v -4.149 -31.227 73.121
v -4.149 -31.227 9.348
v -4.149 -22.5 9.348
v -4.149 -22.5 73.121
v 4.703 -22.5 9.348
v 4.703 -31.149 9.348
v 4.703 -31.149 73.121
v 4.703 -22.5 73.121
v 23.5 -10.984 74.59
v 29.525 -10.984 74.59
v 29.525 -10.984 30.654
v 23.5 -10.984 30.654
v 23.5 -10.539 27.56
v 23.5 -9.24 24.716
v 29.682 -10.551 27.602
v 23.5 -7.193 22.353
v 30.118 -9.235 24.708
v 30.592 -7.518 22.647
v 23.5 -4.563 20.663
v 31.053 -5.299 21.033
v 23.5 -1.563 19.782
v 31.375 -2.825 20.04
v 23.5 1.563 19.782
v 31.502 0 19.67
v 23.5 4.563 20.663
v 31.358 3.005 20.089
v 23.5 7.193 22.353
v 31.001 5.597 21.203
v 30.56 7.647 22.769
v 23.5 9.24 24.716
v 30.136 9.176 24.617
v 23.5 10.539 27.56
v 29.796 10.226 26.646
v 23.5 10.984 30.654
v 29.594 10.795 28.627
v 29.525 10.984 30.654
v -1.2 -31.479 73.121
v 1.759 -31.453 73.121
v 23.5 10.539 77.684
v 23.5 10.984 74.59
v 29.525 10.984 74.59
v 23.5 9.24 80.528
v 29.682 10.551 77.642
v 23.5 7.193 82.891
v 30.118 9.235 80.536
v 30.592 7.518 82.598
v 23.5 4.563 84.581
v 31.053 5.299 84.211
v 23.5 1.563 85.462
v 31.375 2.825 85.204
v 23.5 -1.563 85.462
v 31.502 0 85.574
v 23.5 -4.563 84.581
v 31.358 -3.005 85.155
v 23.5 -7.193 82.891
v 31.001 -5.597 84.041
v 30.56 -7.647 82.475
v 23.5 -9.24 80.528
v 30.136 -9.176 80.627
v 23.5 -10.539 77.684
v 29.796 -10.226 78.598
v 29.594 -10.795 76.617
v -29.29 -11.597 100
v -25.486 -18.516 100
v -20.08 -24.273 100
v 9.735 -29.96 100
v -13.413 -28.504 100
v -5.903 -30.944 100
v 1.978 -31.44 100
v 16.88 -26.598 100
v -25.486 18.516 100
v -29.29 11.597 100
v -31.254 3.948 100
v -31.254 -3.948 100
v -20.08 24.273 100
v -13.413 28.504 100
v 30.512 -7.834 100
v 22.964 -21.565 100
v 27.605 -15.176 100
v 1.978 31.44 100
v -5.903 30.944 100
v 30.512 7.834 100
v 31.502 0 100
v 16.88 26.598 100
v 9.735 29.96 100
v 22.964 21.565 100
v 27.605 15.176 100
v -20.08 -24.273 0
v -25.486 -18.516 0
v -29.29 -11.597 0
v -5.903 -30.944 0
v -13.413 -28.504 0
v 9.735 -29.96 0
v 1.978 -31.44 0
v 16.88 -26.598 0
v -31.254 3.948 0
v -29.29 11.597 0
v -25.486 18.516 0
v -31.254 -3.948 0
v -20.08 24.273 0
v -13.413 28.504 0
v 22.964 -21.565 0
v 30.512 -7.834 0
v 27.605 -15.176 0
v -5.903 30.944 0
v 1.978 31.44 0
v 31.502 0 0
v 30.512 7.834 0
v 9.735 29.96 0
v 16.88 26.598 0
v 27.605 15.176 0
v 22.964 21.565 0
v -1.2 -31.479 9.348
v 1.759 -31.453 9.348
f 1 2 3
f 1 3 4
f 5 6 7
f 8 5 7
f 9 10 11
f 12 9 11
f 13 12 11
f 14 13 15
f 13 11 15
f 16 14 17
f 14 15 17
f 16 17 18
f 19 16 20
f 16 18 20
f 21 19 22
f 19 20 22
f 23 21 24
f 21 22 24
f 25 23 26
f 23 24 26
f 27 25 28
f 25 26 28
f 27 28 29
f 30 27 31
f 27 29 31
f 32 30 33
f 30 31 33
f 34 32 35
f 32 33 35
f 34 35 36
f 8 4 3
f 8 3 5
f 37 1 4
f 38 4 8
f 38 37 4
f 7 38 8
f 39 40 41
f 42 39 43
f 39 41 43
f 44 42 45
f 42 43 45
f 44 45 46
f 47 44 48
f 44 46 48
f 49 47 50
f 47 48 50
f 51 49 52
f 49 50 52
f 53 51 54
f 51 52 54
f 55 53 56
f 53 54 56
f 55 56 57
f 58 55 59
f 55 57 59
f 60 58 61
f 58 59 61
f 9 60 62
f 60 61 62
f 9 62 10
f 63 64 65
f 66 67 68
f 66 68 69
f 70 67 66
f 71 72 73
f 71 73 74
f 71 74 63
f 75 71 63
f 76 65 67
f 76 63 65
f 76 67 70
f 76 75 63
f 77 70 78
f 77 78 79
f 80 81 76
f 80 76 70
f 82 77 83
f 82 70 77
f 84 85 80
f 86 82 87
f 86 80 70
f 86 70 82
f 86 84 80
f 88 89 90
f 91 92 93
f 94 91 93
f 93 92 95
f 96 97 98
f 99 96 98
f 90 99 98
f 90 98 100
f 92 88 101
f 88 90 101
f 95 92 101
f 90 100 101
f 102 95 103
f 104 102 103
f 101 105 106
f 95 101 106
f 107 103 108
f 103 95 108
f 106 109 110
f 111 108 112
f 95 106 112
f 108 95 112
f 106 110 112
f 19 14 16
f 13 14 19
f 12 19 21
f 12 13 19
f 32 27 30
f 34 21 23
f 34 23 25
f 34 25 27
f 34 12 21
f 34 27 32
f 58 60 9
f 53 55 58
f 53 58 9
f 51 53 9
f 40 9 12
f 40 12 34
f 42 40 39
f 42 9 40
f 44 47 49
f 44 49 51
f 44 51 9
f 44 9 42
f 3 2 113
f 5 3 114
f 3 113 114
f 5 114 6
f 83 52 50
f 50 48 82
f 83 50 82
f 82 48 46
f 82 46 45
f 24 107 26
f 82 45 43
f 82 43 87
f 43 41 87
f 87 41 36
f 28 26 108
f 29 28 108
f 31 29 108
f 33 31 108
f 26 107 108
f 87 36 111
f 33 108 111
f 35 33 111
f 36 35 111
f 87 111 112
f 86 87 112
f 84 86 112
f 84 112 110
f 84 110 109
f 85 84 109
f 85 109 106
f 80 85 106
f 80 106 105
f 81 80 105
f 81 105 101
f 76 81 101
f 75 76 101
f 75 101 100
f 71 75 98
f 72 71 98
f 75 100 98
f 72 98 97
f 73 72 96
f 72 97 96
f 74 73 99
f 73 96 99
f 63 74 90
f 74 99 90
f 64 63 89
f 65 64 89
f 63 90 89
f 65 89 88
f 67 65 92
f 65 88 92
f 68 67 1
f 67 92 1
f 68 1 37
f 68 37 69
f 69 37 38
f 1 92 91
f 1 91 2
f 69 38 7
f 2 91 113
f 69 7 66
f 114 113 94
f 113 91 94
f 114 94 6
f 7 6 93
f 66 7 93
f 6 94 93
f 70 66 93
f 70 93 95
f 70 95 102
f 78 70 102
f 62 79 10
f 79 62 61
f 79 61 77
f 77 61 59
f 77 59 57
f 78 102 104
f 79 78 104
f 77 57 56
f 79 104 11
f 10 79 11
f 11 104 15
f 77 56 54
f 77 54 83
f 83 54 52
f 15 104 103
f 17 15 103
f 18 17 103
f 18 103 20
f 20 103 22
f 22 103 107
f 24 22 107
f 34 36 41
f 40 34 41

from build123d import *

# Parameters (mm, degrees)
SKETCH_R        = 31.501905
PAD_DEPTH       = 100
SKETCH001_W     = 8.851912
SKETCH001_H     = 63.773734
POCKET_DEPTH    = 8.5
POCKET001_DEPTH = 7.5


with BuildPart() as part:
    # Sketch (on Sketch) → Pad (new body)
    with BuildSketch(Plane.XY):
        Circle(SKETCH_R)
    extrude(amount=PAD_DEPTH)

    # Sketch001 (on Sketch) → Pocket (cut, symmetric)
    with BuildSketch(Plane(origin=(-2, -31, 0), x_dir=(1, 0, 0), z_dir=(0, -1, 0))):
        with Locations((2.276907, 41.234547)):
            Rectangle(SKETCH001_W, SKETCH001_H)
    extrude(amount=POCKET_DEPTH, both=True, mode=Mode.SUBTRACT)

    # Sketch002 → Pocket001 (cut, symmetric)
    with BuildSketch(Plane.YZ.offset(31)):
        with BuildLine():
            ThreePointArc((10.983905, 74.589867), (0, 85.573772), (-10.983905, 74.589867))
            Line((-10.983905, 74.589867), (-10.983905, 30.654249))
            ThreePointArc((-10.983905, 30.654249), (0, 19.670344), (10.983905, 30.654249))
            Line((10.983905, 30.654249), (10.983905, 74.589867))
        make_face()
    extrude(amount=POCKET001_DEPTH, both=True, mode=Mode.SUBTRACT)


solid = part.part
